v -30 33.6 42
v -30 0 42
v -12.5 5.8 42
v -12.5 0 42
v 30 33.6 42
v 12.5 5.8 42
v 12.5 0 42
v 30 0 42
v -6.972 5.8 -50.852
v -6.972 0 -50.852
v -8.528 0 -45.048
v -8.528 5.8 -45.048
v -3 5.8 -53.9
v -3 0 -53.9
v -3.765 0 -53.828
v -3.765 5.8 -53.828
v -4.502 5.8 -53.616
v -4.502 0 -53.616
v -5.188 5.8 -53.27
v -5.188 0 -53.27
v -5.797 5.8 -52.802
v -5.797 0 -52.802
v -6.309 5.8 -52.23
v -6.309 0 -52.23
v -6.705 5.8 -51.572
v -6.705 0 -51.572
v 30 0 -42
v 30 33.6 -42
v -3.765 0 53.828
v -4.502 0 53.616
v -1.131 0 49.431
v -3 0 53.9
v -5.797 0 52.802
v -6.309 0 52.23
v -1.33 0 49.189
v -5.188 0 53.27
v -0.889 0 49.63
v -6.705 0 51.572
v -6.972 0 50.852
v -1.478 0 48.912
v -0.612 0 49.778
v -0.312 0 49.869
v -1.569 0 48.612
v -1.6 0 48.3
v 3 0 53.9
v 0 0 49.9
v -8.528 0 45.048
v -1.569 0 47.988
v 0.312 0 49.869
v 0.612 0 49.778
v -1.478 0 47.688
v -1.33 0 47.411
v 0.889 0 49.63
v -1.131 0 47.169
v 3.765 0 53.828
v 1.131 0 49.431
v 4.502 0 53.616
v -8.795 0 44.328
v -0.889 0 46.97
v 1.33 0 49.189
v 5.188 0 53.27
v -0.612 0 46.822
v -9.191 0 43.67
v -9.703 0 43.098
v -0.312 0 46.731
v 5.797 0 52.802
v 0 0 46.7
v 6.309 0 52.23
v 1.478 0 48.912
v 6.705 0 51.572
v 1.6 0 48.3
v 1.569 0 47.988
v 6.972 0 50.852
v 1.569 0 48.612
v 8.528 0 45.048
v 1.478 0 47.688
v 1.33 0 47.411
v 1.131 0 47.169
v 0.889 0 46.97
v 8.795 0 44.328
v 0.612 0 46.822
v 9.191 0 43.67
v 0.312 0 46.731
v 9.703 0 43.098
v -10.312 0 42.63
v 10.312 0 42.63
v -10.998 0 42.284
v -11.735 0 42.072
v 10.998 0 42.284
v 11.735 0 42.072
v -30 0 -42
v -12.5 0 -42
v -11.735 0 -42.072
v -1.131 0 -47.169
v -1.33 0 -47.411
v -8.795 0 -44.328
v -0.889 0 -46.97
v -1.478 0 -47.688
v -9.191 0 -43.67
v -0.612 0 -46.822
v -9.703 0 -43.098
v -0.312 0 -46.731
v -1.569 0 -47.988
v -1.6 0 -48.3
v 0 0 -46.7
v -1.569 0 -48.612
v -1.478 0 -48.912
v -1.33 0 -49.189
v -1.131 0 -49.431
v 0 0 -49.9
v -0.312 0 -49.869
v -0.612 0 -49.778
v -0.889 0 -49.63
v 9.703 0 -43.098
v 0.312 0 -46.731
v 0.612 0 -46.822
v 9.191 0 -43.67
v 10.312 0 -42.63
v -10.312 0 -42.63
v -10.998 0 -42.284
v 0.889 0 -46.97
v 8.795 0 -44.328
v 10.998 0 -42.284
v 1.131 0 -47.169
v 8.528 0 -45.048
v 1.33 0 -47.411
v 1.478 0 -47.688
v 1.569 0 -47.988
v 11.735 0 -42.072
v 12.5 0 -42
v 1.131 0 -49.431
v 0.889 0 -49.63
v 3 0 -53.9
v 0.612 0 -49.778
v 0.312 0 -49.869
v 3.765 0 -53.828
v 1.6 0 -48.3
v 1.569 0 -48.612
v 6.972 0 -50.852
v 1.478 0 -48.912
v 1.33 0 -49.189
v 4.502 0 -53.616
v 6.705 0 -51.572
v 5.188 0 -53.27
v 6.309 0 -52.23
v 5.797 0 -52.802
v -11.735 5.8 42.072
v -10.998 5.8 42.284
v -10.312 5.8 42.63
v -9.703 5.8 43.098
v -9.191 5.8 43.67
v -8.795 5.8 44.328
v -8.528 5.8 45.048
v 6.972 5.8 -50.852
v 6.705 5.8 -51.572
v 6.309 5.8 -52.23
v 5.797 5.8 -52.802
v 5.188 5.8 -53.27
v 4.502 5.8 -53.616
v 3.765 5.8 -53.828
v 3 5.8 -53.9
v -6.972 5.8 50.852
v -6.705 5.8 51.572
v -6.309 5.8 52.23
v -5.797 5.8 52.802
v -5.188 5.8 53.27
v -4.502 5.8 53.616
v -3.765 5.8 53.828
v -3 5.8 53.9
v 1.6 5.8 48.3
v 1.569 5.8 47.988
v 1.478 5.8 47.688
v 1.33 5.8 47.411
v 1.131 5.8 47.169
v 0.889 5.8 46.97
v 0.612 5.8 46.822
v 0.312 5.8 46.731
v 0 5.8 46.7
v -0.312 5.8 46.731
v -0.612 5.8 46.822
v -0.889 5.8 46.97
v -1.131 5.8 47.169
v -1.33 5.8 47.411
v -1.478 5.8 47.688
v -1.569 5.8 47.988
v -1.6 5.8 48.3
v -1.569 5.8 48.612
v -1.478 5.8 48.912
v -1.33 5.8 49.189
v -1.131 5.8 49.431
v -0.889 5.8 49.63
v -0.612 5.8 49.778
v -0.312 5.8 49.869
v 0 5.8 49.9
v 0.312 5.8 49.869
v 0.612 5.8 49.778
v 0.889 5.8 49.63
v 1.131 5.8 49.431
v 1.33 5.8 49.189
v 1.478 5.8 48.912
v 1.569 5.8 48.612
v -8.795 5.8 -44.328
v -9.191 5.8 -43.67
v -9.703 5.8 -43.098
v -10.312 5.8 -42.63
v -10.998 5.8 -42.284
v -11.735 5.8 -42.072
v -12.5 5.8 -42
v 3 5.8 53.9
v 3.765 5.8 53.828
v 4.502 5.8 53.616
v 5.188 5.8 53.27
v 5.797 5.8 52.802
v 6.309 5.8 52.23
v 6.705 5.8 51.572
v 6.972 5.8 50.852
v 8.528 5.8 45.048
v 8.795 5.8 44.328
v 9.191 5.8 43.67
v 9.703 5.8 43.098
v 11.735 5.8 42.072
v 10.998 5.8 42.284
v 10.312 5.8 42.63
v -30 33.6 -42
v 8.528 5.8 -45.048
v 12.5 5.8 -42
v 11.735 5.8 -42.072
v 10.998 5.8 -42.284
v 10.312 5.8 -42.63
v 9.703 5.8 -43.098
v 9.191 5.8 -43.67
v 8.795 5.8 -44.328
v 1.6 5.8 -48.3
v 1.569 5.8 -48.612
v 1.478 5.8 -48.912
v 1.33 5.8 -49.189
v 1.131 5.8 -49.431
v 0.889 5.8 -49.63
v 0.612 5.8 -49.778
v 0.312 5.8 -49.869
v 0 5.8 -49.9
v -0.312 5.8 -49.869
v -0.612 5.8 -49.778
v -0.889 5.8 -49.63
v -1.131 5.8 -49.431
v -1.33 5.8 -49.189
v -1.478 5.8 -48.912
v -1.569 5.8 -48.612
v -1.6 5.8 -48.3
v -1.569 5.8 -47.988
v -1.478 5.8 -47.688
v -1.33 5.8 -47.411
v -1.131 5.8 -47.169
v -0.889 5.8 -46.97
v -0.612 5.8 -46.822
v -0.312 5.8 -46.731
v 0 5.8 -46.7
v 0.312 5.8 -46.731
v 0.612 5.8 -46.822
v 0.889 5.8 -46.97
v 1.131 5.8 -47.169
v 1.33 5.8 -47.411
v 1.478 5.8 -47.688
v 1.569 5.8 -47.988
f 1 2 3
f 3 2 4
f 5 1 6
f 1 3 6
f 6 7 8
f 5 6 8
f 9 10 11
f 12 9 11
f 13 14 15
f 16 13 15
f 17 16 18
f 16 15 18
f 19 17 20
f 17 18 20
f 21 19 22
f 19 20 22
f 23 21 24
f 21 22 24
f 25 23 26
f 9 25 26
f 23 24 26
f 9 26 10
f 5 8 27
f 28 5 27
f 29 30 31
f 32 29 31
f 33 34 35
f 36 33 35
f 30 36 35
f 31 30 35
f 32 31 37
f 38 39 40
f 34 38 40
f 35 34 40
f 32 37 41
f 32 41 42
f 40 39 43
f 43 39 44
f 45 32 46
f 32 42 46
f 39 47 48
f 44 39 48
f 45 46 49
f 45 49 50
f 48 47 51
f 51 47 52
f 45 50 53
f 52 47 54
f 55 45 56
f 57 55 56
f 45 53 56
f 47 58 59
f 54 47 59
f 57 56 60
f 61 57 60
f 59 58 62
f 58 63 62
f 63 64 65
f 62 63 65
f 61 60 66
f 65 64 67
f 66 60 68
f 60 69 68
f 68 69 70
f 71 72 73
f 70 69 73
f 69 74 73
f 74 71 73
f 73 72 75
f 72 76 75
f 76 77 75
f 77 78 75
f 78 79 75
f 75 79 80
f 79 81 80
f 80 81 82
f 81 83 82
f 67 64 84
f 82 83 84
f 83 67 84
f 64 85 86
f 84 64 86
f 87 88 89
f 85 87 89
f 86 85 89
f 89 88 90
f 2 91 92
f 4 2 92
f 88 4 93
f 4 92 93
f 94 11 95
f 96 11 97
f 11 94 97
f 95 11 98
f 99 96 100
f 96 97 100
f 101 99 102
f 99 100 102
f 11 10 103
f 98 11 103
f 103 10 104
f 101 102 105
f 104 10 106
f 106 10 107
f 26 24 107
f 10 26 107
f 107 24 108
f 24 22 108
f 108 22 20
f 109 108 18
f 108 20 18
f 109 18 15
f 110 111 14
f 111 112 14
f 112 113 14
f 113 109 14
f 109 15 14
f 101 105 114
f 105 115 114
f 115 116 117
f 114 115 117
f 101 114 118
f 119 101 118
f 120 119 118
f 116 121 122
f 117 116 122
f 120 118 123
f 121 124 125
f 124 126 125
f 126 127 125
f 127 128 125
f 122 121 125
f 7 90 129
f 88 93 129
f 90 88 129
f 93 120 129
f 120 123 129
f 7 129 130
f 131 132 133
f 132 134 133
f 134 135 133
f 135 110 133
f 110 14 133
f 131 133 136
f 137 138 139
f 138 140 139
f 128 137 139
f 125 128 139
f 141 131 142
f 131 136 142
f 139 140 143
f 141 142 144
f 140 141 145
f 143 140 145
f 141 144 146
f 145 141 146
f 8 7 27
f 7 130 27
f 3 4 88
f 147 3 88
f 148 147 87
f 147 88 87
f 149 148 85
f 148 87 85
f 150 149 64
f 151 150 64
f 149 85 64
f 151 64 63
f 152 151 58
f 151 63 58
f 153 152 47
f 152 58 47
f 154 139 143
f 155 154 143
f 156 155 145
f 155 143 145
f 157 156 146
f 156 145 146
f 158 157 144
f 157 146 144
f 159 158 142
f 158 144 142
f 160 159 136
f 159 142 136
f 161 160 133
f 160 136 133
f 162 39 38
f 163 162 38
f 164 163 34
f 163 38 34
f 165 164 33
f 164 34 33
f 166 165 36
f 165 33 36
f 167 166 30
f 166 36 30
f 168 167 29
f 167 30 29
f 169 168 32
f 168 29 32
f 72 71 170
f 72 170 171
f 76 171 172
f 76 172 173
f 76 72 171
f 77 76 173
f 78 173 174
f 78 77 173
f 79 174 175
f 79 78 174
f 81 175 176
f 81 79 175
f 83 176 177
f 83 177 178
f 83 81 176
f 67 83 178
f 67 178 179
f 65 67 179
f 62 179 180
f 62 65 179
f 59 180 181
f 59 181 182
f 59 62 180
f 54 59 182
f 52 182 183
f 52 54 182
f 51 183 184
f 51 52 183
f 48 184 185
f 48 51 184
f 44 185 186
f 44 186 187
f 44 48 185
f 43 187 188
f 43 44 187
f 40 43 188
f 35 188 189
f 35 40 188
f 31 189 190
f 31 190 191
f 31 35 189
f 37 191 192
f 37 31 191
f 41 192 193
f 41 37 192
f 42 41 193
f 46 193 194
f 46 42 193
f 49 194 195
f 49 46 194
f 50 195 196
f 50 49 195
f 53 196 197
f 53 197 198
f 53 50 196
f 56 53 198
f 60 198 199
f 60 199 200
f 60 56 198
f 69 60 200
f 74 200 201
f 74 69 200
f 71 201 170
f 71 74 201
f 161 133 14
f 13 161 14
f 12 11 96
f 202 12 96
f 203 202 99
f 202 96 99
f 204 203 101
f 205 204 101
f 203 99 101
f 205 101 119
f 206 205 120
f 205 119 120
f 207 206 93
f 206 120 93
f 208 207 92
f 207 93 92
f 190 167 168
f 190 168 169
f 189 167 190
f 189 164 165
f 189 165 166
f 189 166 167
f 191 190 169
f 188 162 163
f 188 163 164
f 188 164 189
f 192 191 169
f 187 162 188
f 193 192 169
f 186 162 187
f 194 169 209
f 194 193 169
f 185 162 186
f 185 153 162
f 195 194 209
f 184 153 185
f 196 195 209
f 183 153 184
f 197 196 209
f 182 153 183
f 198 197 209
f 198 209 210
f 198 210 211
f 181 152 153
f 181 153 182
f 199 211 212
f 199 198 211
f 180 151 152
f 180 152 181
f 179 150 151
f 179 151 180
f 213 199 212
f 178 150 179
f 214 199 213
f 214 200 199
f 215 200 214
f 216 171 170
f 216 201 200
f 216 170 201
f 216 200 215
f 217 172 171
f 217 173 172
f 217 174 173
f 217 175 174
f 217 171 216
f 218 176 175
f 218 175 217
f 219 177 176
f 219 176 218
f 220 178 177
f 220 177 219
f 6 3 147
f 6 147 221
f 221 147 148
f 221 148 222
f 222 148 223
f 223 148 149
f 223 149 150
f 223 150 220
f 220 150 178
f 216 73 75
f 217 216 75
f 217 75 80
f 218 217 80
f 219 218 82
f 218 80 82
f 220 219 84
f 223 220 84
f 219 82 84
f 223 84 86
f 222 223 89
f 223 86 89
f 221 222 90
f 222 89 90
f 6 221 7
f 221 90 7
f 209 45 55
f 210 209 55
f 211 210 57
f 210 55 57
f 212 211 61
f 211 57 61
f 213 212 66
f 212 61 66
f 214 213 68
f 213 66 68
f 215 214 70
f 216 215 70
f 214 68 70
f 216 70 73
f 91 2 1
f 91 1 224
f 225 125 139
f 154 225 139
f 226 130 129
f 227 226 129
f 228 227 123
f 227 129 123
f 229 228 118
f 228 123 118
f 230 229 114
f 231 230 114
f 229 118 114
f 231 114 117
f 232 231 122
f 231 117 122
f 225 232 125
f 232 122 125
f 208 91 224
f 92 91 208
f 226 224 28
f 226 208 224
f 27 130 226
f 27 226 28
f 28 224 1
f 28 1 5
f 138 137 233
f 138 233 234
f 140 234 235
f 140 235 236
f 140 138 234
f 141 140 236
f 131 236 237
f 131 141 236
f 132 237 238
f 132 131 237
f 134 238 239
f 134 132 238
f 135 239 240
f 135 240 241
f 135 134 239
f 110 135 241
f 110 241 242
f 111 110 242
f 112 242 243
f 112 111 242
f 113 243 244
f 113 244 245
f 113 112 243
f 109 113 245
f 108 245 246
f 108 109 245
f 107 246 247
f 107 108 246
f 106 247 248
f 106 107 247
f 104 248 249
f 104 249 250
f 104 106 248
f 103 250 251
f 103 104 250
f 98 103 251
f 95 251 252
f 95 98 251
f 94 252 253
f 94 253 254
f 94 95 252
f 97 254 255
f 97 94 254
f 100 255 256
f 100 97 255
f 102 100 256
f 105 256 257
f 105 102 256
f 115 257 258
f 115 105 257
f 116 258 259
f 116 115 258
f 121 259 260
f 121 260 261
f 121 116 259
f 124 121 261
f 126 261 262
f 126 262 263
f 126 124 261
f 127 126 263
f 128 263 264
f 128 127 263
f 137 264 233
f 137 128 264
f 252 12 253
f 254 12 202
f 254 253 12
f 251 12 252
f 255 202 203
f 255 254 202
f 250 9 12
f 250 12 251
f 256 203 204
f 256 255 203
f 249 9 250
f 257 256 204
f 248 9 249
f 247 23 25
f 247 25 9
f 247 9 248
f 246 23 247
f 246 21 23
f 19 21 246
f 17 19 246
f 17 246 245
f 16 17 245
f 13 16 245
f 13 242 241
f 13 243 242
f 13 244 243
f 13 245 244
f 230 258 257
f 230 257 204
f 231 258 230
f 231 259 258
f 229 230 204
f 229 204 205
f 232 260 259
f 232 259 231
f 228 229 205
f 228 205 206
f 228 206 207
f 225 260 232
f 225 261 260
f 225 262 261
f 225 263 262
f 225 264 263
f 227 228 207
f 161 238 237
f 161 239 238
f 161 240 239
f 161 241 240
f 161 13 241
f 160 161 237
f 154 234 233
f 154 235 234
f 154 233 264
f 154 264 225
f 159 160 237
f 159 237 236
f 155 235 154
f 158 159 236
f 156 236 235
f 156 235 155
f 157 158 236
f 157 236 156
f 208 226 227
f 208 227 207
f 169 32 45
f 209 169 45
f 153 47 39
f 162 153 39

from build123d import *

# Parameters (mm, degrees)
SKETCH1_W           = 60
SKETCH1_H           = 84
BOSS_EXTRUDE1_DEPTH = 33.6
SKETCH2_R           = 1.6
BOSS_EXTRUDE2_DEPTH = 5.8


with BuildPart() as part:
    # Sketch1 → Boss-Extrude1 (new body)
    with BuildSketch(Plane(origin=(0, 0, 0), x_dir=(1, 0, 0), z_dir=(0, 1, 0))):
        Rectangle(SKETCH1_W, SKETCH1_H)
    extrude(amount=BOSS_EXTRUDE1_DEPTH)

    # Sketch2 → Boss-Extrude2 (add)
    with BuildSketch(Plane(origin=(0, 0, 0), x_dir=(1, 0, 0), z_dir=(0, 1, 0))):
        with BuildLine():
            Line((-12.5, 42), (12.5, 42))
            ThreePointArc((12.5, 42), (9.996413035, 42.849853258), (8.527541838, 45.048174357))
            Line((8.527541838, 45.048174357), (6.972458162, 50.851825643))
            ThreePointArc((6.972458162, 50.851825643), (5.503586965, 53.050146742), (3, 53.9))
            Line((3, 53.9), (-3, 53.9))
            ThreePointArc((-3, 53.9), (-5.503586965, 53.050146742), (-6.972458162, 50.851825643))
            Line((-6.972458162, 50.851825643), (-8.527541838, 45.048174357))
            ThreePointArc((-8.527541838, 45.048174357), (-9.996413035, 42.849853258), (-12.5, 42))
        make_face()
        with Locations((0, 48.3)):
            Circle(SKETCH2_R, mode=Mode.SUBTRACT)
        with BuildLine():
            Line((6.972458162, -50.851825643), (8.527541838, -45.048174357))
            ThreePointArc((8.527541838, -45.048174357), (9.996413035, -42.849853258), (12.5, -42))
            Line((12.5, -42), (-12.5, -42))
            ThreePointArc((-12.5, -42), (-9.996413035, -42.849853258), (-8.527541838, -45.048174357))
            Line((-8.527541838, -45.048174357), (-6.972458162, -50.851825643))
            ThreePointArc((-6.972458162, -50.851825643), (-5.503586965, -53.050146742), (-3, -53.9))
            Line((-3, -53.9), (3, -53.9))
            ThreePointArc((3, -53.9), (5.503586965, -53.050146742), (6.972458162, -50.851825643))
        make_face()
        with Locations((0, -48.3)):
            Circle(SKETCH2_R, mode=Mode.SUBTRACT)
    extrude(amount=BOSS_EXTRUDE2_DEPTH)


solid = part.part
